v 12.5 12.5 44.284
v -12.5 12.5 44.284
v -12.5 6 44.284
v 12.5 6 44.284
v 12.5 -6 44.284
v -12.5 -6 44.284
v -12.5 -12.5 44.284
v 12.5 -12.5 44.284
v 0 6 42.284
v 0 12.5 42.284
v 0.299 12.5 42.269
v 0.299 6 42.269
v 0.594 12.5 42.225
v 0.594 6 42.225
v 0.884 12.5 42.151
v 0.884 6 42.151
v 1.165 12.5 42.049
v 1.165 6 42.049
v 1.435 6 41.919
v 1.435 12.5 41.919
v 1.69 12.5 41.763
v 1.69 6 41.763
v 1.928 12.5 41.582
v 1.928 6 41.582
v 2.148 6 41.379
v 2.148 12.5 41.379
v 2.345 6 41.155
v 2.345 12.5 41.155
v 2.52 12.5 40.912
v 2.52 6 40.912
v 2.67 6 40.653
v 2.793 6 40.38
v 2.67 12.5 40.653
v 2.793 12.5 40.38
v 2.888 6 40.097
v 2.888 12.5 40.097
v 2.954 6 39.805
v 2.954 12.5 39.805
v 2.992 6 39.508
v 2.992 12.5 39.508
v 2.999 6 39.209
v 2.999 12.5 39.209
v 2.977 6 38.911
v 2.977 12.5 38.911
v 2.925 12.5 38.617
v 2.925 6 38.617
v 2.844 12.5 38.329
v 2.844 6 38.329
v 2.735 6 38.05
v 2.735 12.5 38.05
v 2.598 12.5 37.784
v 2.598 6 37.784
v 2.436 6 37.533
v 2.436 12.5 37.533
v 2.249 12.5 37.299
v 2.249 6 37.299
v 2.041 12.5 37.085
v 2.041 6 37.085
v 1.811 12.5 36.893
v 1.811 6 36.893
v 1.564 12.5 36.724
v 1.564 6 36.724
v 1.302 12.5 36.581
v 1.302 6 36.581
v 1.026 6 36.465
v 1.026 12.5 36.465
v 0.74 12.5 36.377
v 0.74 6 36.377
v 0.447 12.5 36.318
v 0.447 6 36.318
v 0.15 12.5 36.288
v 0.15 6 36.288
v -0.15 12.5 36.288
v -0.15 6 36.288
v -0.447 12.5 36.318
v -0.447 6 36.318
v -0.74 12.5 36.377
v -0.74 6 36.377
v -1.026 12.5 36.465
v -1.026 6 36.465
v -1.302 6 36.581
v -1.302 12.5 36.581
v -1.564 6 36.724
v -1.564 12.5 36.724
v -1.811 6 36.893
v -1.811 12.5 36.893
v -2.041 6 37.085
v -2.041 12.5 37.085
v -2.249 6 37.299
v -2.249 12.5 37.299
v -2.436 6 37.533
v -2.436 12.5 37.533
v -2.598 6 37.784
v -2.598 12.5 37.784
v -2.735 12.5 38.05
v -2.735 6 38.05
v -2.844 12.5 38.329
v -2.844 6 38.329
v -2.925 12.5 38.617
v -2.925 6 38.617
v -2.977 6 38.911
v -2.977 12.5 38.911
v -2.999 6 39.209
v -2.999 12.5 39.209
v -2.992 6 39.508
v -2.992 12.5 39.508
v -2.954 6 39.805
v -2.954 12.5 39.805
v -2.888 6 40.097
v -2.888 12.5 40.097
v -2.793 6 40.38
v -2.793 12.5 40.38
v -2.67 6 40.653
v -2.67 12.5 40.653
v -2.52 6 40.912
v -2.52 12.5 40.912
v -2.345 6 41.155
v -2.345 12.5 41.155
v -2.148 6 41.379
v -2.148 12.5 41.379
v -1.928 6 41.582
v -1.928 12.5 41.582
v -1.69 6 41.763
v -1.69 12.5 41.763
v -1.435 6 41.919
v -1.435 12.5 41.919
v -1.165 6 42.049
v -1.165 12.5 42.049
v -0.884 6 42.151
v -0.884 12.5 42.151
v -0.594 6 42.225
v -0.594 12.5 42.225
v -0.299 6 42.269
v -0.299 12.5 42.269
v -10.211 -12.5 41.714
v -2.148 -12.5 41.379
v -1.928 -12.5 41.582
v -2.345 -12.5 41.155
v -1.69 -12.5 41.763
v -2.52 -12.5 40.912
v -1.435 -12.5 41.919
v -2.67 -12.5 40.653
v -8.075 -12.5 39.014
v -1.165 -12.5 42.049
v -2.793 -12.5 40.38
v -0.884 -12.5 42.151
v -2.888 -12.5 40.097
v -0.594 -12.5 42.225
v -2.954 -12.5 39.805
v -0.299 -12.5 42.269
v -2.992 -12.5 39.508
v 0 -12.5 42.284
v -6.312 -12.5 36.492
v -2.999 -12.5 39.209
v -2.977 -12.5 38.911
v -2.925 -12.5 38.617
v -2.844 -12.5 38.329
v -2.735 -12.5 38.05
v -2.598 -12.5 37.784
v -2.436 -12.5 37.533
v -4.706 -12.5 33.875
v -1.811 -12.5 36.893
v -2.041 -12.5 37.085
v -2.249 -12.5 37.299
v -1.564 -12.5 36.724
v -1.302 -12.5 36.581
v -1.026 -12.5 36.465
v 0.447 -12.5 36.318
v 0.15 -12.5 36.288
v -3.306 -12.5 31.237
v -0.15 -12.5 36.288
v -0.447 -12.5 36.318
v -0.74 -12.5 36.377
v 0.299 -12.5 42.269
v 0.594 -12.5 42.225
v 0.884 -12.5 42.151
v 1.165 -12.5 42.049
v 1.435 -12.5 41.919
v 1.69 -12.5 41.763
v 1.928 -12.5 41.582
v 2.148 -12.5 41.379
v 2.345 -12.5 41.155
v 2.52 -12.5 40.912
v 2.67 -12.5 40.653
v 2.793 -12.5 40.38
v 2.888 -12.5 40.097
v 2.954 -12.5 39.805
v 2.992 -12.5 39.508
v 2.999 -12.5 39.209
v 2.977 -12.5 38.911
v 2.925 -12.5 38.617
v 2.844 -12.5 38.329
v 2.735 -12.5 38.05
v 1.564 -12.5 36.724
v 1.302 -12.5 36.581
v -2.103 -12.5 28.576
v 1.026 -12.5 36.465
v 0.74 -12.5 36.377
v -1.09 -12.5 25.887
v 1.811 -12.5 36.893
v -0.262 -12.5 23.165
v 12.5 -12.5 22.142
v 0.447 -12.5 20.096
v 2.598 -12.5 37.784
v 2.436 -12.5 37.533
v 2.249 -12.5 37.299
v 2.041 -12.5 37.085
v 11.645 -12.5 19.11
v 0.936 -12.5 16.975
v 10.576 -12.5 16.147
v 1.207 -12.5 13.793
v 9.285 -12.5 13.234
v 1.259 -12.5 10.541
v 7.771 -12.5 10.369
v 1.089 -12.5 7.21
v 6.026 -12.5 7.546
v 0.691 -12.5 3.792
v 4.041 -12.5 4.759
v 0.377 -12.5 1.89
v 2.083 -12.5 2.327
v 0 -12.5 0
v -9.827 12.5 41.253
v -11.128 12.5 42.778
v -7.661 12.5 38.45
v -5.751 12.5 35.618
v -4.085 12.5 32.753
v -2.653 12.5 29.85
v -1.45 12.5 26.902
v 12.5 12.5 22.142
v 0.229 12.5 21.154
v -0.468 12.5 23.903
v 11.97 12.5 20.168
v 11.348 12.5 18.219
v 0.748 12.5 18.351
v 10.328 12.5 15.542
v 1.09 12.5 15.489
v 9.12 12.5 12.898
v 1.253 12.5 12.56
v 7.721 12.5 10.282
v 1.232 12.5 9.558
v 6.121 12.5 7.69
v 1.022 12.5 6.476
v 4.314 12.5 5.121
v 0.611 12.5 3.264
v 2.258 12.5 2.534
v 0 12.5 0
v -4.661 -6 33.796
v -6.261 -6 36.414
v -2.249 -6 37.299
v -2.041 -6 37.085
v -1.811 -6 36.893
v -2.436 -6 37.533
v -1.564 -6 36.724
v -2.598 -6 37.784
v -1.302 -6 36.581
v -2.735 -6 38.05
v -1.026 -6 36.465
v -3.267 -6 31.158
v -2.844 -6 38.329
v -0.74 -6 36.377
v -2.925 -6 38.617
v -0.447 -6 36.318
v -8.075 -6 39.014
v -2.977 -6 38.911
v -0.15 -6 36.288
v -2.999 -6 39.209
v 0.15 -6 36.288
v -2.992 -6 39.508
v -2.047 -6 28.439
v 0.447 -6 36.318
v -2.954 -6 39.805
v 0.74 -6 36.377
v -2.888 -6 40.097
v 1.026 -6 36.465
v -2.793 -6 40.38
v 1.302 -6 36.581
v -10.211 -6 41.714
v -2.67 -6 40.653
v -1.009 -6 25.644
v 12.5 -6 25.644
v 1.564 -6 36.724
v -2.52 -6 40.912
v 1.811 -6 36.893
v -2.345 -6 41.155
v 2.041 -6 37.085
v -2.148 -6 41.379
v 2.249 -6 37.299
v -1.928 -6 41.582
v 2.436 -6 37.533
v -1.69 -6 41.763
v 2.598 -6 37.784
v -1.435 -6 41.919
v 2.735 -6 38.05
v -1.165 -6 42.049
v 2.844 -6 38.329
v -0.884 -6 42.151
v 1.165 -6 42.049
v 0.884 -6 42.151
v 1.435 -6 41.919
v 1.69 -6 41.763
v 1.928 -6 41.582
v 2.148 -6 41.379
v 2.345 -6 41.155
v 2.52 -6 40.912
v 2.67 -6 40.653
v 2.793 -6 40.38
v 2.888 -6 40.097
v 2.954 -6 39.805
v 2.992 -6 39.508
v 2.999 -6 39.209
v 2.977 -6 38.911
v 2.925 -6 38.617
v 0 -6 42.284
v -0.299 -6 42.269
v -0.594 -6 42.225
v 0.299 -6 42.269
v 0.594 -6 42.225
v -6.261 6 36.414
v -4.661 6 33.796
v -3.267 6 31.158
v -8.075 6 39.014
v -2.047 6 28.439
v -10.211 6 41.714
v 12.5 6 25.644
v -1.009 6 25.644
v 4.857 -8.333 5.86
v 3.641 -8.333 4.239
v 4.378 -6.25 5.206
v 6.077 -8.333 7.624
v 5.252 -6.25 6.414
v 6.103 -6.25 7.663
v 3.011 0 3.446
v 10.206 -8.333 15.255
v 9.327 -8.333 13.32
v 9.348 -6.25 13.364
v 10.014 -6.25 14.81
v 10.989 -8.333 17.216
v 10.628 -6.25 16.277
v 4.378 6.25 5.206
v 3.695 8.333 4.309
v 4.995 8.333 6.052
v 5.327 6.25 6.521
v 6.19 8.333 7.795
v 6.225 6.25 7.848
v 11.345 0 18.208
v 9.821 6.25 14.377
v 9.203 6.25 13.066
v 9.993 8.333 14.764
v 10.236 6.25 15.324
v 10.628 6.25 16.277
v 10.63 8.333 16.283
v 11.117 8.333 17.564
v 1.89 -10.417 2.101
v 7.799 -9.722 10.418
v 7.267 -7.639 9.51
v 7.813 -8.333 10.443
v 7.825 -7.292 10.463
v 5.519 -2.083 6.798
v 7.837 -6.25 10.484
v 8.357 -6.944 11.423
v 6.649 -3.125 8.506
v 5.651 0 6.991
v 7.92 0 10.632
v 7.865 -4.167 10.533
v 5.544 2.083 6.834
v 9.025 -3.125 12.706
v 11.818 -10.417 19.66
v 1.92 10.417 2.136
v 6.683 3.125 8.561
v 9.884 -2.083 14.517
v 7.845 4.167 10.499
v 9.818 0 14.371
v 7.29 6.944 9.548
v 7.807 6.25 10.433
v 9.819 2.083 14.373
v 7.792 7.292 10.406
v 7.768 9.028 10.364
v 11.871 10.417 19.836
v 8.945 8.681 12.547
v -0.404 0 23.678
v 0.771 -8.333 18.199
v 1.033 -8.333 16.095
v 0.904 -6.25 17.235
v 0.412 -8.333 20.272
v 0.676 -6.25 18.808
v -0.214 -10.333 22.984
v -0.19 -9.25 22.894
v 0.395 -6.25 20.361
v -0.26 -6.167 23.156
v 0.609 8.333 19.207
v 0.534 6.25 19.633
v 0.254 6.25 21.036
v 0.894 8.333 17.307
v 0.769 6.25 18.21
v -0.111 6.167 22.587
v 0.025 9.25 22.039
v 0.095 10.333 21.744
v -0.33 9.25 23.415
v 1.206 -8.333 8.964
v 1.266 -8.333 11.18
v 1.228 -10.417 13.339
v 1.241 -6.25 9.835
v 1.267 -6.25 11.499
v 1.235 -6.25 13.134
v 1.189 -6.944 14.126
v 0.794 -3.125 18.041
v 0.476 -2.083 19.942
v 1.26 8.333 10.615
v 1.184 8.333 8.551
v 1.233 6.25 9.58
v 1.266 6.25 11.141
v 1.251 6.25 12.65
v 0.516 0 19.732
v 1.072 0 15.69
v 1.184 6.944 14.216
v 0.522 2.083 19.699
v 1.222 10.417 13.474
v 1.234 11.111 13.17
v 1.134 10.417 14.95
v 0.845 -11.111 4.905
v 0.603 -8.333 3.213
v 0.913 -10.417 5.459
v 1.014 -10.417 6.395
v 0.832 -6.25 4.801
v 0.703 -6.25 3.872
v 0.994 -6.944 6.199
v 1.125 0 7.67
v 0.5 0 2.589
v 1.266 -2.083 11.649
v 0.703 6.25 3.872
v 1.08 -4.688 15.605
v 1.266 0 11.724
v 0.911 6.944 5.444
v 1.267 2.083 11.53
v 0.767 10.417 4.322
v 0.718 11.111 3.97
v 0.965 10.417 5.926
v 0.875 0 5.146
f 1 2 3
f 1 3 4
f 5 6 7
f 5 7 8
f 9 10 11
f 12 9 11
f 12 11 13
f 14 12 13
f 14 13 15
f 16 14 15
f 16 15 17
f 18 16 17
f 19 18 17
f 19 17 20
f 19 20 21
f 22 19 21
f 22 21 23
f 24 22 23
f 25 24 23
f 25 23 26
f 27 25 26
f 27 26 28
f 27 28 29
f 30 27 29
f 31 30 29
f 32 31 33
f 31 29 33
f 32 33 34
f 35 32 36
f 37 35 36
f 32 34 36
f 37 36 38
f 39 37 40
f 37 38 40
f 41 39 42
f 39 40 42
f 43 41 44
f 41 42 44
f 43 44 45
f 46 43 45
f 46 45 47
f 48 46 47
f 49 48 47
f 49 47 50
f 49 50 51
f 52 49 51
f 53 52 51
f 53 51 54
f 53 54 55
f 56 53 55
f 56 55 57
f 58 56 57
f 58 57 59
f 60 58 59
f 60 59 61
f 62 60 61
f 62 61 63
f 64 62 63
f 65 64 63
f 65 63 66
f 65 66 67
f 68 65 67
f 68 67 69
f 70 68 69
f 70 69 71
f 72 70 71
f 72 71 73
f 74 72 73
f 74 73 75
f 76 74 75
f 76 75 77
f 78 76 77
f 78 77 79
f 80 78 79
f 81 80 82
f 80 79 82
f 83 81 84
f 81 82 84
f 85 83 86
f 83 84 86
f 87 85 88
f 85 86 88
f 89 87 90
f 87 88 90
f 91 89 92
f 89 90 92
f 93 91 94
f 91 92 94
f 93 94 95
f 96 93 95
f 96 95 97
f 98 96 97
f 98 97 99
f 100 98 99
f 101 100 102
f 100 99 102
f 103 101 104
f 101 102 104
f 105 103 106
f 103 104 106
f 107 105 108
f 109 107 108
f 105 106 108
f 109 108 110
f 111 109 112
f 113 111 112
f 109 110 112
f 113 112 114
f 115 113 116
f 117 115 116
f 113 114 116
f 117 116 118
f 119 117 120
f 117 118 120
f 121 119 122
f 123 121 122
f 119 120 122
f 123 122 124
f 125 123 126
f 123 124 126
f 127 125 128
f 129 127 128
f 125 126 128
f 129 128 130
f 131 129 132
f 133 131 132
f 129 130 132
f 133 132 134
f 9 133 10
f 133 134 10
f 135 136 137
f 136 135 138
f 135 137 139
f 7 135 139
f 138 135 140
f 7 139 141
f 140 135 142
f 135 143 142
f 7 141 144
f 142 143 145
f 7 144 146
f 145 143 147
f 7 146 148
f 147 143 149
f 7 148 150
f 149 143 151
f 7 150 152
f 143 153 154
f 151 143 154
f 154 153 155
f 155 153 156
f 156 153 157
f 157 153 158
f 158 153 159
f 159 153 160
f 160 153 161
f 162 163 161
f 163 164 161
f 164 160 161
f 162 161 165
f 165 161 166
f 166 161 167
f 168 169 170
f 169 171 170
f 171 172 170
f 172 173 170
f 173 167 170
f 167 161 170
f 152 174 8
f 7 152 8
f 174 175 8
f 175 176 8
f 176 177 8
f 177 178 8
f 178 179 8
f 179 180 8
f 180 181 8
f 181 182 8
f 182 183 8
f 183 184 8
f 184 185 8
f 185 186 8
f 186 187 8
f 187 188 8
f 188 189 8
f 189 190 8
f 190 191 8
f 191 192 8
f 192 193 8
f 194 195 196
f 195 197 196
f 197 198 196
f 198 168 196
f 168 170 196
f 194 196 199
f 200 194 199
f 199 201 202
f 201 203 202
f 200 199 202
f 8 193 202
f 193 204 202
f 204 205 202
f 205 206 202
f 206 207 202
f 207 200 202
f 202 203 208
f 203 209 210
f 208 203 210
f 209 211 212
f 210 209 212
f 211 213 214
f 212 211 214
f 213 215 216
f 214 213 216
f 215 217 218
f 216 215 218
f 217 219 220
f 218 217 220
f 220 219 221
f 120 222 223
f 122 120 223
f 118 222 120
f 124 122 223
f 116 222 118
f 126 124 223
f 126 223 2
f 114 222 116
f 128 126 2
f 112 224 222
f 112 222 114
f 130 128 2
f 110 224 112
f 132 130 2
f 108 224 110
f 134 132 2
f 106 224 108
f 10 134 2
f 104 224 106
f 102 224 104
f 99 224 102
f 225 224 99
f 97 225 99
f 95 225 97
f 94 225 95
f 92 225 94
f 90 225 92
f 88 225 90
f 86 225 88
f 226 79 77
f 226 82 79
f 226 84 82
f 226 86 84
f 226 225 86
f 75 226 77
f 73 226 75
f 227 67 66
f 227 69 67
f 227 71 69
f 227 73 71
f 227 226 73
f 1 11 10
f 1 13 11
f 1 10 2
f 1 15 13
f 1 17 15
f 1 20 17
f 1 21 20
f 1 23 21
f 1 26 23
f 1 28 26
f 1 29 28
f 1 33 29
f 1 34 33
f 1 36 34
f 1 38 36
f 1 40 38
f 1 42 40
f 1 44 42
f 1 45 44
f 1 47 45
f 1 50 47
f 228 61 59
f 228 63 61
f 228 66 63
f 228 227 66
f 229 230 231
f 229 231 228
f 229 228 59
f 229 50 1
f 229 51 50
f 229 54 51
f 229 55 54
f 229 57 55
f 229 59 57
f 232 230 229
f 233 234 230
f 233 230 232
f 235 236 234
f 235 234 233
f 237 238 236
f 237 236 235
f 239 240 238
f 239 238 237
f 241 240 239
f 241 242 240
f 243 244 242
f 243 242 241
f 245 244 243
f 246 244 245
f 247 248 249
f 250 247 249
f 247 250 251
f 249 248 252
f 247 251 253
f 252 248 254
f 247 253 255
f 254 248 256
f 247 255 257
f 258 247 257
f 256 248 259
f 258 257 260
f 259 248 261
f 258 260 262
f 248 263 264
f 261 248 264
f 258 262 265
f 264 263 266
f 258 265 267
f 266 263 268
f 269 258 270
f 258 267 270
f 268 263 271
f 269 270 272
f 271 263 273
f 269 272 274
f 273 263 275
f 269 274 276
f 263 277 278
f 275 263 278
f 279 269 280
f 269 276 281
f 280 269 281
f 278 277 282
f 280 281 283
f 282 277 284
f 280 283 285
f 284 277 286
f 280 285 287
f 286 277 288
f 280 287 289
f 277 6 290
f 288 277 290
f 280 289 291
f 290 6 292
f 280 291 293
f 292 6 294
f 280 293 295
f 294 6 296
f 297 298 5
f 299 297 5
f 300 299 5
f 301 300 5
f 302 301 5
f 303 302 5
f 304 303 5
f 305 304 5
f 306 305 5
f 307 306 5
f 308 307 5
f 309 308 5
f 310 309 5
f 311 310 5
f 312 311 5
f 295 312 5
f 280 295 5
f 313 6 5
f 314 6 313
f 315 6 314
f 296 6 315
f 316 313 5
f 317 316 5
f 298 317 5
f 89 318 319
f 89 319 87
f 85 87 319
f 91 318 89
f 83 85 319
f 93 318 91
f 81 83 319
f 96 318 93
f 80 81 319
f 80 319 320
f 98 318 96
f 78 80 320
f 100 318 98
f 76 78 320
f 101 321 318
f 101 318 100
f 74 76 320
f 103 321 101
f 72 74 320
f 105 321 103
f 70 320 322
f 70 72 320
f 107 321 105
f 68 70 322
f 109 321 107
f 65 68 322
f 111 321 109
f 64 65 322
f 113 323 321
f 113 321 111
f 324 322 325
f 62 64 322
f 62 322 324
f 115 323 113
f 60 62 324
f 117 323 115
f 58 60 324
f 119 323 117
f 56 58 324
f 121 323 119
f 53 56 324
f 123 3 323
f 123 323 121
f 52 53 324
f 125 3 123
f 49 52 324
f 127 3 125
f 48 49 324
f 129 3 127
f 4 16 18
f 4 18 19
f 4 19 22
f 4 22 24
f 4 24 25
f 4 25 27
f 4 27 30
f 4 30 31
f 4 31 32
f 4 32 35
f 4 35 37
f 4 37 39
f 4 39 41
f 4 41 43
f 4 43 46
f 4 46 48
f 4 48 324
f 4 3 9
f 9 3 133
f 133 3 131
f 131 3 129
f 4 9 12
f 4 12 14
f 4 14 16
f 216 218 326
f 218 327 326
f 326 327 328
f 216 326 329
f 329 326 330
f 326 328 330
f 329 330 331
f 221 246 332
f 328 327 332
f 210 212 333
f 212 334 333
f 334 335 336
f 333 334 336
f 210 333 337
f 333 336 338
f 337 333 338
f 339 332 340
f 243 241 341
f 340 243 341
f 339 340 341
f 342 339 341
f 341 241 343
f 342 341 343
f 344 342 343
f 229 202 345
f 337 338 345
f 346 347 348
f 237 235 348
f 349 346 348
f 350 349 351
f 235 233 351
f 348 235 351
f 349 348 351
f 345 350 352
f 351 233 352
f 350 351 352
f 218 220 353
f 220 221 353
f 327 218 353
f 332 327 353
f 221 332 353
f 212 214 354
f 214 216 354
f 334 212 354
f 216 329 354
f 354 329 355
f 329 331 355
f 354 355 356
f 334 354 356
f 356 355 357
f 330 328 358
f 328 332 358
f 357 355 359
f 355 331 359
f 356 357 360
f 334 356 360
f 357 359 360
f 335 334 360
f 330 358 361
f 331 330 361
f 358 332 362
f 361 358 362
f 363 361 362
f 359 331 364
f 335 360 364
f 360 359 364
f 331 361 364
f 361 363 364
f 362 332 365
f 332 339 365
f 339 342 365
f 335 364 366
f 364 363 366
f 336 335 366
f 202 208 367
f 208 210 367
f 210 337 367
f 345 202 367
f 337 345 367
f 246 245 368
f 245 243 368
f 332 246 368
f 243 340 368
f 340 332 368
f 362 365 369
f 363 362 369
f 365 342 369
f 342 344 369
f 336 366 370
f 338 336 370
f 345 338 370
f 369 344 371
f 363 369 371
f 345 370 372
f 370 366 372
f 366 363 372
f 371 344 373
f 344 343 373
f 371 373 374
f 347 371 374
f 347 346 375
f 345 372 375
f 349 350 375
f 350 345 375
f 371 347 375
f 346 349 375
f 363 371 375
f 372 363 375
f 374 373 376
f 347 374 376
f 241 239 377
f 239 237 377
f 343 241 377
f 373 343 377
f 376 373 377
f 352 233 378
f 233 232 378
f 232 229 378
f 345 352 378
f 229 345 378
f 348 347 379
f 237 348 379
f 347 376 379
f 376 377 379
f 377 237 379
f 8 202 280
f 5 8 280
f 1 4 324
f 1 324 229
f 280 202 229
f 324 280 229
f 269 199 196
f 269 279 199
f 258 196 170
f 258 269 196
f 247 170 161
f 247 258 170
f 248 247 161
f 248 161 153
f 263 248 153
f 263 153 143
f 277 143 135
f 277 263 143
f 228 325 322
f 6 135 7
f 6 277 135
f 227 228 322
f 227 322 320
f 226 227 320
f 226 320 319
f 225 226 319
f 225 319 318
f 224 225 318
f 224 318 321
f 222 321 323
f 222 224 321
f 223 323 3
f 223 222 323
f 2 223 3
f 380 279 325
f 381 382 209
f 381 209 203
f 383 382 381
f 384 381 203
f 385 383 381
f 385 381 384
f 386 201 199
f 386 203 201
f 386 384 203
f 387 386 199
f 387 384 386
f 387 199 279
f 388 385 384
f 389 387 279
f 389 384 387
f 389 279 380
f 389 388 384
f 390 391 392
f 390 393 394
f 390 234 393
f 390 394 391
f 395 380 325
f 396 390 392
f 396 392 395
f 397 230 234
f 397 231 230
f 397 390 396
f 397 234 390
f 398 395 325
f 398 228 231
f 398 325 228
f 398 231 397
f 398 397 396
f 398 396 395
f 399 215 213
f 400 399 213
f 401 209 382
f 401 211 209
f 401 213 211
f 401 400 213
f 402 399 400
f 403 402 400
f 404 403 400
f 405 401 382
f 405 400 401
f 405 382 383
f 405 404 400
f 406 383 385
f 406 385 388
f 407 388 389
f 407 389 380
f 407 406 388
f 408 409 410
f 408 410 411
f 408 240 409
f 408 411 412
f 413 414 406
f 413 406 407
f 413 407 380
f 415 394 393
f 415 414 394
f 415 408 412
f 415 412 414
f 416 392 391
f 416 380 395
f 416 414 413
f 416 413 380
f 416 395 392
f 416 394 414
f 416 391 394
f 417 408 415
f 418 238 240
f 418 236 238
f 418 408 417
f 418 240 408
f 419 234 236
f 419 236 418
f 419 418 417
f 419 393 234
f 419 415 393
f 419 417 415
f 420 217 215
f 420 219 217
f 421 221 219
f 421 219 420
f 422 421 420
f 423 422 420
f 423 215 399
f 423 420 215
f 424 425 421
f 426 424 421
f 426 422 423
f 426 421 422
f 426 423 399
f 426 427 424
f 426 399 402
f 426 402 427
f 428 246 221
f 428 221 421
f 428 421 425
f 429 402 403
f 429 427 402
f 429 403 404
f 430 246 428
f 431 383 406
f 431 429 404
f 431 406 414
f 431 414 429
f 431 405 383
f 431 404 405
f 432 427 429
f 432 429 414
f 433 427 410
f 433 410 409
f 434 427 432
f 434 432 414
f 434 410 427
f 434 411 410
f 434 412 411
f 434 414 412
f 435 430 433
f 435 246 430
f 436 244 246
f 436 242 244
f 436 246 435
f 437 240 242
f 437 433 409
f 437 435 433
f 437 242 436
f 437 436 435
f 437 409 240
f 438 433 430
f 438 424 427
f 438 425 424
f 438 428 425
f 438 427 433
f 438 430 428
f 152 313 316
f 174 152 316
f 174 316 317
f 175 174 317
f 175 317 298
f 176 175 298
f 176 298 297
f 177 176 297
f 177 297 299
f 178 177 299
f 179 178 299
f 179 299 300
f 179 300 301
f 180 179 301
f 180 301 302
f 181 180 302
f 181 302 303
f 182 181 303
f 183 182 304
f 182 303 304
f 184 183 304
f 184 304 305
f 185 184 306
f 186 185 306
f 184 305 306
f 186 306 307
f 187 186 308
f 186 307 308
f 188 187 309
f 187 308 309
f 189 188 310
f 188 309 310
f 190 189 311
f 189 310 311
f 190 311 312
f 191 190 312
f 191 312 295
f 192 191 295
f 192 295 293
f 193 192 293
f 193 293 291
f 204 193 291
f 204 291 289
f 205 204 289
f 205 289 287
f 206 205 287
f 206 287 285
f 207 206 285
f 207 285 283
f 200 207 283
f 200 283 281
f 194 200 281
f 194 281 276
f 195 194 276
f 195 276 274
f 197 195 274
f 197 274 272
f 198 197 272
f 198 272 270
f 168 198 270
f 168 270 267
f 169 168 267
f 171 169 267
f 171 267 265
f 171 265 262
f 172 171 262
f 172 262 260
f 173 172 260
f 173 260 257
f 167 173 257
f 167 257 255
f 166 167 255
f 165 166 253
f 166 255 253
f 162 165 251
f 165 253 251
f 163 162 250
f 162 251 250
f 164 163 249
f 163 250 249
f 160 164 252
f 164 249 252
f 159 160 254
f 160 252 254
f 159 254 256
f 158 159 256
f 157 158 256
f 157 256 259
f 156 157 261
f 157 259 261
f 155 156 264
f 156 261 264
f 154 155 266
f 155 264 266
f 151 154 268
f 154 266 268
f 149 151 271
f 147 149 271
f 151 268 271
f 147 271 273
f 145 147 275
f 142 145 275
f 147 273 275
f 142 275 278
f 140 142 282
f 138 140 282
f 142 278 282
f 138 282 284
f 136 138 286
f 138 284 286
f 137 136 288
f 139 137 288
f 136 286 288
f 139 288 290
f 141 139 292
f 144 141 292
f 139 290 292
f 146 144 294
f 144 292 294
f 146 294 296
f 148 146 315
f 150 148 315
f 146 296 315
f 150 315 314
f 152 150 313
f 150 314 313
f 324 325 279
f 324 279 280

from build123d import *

# Parameters (mm, degrees)
SKETCH_1_W          = 25
SKETCH_1_H          = 25
EXTRUDE_1_DEPTH     = 44.284173786
SKETCH_2_R          = 3
CUT_EXTRUDE_1_DEPTH = 36.406845426
SKETCH_4_W          = 25
SKETCH_4_H          = 12
CUT_EXTRUDE_2_DEPTH = 18.639834826
CUT_EXTRUDE_3_DEPTH = 40


with BuildPart() as part:
    # 스케치1 → 보스-돌출1 (new body)
    with BuildSketch(Plane.XY):
        Rectangle(SKETCH_1_W, SKETCH_1_H)
    extrude(amount=EXTRUDE_1_DEPTH)

    # 스케치2 → 컷-돌출1 (cut)
    with BuildSketch(Plane(origin=(0, 12.5, 0), x_dir=(1, 0, 0), z_dir=(0, 1, 0))):
        with Locations(Location((0, -39.284173786, 0), (0, 0, 270))):
            Circle(SKETCH_2_R)
    extrude(amount=-CUT_EXTRUDE_1_DEPTH, mode=Mode.SUBTRACT)

    # 스케치4 → 컷-돌출2 (cut)
    with BuildSketch(Plane.XY.offset(44.284173786)):
        Rectangle(SKETCH_4_W, SKETCH_4_H)
    extrude(amount=-CUT_EXTRUDE_2_DEPTH, mode=Mode.SUBTRACT)

    # 스케치5 → 컷-돌출3 (cut)
    with BuildSketch(Plane(origin=(0, 12.5, 0), x_dir=(1, 0, 0), z_dir=(0, 1, 0))):
        with BuildLine():
            Line((-47.02485921, -52.228316923), (5.705393133, 41.461873578))
            Line((5.705393133, 41.461873578), (28.83172343, -24.155832398))
            Line((28.83172343, -24.155832398), (12.5, -44.284173786))
            add(Edge.make_bspline(
                [(0, 0), (17.942606177, -19.069541042), (12.5, -44.284173786)],
                knots=[0, 0, 0, 1, 1, 1], degree=2))
            add(Edge.make_bspline(
                [(0, 0), (5.442606177, -25.214632744), (-12.5, -44.284173786)],
                knots=[0, 0, 0, 1, 1, 1], degree=2))
            Line((-12.5, -44.284173786), (-47.02485921, -52.228316923))
        make_face()
    extrude(amount=-CUT_EXTRUDE_3_DEPTH, mode=Mode.SUBTRACT)


solid = part.part
